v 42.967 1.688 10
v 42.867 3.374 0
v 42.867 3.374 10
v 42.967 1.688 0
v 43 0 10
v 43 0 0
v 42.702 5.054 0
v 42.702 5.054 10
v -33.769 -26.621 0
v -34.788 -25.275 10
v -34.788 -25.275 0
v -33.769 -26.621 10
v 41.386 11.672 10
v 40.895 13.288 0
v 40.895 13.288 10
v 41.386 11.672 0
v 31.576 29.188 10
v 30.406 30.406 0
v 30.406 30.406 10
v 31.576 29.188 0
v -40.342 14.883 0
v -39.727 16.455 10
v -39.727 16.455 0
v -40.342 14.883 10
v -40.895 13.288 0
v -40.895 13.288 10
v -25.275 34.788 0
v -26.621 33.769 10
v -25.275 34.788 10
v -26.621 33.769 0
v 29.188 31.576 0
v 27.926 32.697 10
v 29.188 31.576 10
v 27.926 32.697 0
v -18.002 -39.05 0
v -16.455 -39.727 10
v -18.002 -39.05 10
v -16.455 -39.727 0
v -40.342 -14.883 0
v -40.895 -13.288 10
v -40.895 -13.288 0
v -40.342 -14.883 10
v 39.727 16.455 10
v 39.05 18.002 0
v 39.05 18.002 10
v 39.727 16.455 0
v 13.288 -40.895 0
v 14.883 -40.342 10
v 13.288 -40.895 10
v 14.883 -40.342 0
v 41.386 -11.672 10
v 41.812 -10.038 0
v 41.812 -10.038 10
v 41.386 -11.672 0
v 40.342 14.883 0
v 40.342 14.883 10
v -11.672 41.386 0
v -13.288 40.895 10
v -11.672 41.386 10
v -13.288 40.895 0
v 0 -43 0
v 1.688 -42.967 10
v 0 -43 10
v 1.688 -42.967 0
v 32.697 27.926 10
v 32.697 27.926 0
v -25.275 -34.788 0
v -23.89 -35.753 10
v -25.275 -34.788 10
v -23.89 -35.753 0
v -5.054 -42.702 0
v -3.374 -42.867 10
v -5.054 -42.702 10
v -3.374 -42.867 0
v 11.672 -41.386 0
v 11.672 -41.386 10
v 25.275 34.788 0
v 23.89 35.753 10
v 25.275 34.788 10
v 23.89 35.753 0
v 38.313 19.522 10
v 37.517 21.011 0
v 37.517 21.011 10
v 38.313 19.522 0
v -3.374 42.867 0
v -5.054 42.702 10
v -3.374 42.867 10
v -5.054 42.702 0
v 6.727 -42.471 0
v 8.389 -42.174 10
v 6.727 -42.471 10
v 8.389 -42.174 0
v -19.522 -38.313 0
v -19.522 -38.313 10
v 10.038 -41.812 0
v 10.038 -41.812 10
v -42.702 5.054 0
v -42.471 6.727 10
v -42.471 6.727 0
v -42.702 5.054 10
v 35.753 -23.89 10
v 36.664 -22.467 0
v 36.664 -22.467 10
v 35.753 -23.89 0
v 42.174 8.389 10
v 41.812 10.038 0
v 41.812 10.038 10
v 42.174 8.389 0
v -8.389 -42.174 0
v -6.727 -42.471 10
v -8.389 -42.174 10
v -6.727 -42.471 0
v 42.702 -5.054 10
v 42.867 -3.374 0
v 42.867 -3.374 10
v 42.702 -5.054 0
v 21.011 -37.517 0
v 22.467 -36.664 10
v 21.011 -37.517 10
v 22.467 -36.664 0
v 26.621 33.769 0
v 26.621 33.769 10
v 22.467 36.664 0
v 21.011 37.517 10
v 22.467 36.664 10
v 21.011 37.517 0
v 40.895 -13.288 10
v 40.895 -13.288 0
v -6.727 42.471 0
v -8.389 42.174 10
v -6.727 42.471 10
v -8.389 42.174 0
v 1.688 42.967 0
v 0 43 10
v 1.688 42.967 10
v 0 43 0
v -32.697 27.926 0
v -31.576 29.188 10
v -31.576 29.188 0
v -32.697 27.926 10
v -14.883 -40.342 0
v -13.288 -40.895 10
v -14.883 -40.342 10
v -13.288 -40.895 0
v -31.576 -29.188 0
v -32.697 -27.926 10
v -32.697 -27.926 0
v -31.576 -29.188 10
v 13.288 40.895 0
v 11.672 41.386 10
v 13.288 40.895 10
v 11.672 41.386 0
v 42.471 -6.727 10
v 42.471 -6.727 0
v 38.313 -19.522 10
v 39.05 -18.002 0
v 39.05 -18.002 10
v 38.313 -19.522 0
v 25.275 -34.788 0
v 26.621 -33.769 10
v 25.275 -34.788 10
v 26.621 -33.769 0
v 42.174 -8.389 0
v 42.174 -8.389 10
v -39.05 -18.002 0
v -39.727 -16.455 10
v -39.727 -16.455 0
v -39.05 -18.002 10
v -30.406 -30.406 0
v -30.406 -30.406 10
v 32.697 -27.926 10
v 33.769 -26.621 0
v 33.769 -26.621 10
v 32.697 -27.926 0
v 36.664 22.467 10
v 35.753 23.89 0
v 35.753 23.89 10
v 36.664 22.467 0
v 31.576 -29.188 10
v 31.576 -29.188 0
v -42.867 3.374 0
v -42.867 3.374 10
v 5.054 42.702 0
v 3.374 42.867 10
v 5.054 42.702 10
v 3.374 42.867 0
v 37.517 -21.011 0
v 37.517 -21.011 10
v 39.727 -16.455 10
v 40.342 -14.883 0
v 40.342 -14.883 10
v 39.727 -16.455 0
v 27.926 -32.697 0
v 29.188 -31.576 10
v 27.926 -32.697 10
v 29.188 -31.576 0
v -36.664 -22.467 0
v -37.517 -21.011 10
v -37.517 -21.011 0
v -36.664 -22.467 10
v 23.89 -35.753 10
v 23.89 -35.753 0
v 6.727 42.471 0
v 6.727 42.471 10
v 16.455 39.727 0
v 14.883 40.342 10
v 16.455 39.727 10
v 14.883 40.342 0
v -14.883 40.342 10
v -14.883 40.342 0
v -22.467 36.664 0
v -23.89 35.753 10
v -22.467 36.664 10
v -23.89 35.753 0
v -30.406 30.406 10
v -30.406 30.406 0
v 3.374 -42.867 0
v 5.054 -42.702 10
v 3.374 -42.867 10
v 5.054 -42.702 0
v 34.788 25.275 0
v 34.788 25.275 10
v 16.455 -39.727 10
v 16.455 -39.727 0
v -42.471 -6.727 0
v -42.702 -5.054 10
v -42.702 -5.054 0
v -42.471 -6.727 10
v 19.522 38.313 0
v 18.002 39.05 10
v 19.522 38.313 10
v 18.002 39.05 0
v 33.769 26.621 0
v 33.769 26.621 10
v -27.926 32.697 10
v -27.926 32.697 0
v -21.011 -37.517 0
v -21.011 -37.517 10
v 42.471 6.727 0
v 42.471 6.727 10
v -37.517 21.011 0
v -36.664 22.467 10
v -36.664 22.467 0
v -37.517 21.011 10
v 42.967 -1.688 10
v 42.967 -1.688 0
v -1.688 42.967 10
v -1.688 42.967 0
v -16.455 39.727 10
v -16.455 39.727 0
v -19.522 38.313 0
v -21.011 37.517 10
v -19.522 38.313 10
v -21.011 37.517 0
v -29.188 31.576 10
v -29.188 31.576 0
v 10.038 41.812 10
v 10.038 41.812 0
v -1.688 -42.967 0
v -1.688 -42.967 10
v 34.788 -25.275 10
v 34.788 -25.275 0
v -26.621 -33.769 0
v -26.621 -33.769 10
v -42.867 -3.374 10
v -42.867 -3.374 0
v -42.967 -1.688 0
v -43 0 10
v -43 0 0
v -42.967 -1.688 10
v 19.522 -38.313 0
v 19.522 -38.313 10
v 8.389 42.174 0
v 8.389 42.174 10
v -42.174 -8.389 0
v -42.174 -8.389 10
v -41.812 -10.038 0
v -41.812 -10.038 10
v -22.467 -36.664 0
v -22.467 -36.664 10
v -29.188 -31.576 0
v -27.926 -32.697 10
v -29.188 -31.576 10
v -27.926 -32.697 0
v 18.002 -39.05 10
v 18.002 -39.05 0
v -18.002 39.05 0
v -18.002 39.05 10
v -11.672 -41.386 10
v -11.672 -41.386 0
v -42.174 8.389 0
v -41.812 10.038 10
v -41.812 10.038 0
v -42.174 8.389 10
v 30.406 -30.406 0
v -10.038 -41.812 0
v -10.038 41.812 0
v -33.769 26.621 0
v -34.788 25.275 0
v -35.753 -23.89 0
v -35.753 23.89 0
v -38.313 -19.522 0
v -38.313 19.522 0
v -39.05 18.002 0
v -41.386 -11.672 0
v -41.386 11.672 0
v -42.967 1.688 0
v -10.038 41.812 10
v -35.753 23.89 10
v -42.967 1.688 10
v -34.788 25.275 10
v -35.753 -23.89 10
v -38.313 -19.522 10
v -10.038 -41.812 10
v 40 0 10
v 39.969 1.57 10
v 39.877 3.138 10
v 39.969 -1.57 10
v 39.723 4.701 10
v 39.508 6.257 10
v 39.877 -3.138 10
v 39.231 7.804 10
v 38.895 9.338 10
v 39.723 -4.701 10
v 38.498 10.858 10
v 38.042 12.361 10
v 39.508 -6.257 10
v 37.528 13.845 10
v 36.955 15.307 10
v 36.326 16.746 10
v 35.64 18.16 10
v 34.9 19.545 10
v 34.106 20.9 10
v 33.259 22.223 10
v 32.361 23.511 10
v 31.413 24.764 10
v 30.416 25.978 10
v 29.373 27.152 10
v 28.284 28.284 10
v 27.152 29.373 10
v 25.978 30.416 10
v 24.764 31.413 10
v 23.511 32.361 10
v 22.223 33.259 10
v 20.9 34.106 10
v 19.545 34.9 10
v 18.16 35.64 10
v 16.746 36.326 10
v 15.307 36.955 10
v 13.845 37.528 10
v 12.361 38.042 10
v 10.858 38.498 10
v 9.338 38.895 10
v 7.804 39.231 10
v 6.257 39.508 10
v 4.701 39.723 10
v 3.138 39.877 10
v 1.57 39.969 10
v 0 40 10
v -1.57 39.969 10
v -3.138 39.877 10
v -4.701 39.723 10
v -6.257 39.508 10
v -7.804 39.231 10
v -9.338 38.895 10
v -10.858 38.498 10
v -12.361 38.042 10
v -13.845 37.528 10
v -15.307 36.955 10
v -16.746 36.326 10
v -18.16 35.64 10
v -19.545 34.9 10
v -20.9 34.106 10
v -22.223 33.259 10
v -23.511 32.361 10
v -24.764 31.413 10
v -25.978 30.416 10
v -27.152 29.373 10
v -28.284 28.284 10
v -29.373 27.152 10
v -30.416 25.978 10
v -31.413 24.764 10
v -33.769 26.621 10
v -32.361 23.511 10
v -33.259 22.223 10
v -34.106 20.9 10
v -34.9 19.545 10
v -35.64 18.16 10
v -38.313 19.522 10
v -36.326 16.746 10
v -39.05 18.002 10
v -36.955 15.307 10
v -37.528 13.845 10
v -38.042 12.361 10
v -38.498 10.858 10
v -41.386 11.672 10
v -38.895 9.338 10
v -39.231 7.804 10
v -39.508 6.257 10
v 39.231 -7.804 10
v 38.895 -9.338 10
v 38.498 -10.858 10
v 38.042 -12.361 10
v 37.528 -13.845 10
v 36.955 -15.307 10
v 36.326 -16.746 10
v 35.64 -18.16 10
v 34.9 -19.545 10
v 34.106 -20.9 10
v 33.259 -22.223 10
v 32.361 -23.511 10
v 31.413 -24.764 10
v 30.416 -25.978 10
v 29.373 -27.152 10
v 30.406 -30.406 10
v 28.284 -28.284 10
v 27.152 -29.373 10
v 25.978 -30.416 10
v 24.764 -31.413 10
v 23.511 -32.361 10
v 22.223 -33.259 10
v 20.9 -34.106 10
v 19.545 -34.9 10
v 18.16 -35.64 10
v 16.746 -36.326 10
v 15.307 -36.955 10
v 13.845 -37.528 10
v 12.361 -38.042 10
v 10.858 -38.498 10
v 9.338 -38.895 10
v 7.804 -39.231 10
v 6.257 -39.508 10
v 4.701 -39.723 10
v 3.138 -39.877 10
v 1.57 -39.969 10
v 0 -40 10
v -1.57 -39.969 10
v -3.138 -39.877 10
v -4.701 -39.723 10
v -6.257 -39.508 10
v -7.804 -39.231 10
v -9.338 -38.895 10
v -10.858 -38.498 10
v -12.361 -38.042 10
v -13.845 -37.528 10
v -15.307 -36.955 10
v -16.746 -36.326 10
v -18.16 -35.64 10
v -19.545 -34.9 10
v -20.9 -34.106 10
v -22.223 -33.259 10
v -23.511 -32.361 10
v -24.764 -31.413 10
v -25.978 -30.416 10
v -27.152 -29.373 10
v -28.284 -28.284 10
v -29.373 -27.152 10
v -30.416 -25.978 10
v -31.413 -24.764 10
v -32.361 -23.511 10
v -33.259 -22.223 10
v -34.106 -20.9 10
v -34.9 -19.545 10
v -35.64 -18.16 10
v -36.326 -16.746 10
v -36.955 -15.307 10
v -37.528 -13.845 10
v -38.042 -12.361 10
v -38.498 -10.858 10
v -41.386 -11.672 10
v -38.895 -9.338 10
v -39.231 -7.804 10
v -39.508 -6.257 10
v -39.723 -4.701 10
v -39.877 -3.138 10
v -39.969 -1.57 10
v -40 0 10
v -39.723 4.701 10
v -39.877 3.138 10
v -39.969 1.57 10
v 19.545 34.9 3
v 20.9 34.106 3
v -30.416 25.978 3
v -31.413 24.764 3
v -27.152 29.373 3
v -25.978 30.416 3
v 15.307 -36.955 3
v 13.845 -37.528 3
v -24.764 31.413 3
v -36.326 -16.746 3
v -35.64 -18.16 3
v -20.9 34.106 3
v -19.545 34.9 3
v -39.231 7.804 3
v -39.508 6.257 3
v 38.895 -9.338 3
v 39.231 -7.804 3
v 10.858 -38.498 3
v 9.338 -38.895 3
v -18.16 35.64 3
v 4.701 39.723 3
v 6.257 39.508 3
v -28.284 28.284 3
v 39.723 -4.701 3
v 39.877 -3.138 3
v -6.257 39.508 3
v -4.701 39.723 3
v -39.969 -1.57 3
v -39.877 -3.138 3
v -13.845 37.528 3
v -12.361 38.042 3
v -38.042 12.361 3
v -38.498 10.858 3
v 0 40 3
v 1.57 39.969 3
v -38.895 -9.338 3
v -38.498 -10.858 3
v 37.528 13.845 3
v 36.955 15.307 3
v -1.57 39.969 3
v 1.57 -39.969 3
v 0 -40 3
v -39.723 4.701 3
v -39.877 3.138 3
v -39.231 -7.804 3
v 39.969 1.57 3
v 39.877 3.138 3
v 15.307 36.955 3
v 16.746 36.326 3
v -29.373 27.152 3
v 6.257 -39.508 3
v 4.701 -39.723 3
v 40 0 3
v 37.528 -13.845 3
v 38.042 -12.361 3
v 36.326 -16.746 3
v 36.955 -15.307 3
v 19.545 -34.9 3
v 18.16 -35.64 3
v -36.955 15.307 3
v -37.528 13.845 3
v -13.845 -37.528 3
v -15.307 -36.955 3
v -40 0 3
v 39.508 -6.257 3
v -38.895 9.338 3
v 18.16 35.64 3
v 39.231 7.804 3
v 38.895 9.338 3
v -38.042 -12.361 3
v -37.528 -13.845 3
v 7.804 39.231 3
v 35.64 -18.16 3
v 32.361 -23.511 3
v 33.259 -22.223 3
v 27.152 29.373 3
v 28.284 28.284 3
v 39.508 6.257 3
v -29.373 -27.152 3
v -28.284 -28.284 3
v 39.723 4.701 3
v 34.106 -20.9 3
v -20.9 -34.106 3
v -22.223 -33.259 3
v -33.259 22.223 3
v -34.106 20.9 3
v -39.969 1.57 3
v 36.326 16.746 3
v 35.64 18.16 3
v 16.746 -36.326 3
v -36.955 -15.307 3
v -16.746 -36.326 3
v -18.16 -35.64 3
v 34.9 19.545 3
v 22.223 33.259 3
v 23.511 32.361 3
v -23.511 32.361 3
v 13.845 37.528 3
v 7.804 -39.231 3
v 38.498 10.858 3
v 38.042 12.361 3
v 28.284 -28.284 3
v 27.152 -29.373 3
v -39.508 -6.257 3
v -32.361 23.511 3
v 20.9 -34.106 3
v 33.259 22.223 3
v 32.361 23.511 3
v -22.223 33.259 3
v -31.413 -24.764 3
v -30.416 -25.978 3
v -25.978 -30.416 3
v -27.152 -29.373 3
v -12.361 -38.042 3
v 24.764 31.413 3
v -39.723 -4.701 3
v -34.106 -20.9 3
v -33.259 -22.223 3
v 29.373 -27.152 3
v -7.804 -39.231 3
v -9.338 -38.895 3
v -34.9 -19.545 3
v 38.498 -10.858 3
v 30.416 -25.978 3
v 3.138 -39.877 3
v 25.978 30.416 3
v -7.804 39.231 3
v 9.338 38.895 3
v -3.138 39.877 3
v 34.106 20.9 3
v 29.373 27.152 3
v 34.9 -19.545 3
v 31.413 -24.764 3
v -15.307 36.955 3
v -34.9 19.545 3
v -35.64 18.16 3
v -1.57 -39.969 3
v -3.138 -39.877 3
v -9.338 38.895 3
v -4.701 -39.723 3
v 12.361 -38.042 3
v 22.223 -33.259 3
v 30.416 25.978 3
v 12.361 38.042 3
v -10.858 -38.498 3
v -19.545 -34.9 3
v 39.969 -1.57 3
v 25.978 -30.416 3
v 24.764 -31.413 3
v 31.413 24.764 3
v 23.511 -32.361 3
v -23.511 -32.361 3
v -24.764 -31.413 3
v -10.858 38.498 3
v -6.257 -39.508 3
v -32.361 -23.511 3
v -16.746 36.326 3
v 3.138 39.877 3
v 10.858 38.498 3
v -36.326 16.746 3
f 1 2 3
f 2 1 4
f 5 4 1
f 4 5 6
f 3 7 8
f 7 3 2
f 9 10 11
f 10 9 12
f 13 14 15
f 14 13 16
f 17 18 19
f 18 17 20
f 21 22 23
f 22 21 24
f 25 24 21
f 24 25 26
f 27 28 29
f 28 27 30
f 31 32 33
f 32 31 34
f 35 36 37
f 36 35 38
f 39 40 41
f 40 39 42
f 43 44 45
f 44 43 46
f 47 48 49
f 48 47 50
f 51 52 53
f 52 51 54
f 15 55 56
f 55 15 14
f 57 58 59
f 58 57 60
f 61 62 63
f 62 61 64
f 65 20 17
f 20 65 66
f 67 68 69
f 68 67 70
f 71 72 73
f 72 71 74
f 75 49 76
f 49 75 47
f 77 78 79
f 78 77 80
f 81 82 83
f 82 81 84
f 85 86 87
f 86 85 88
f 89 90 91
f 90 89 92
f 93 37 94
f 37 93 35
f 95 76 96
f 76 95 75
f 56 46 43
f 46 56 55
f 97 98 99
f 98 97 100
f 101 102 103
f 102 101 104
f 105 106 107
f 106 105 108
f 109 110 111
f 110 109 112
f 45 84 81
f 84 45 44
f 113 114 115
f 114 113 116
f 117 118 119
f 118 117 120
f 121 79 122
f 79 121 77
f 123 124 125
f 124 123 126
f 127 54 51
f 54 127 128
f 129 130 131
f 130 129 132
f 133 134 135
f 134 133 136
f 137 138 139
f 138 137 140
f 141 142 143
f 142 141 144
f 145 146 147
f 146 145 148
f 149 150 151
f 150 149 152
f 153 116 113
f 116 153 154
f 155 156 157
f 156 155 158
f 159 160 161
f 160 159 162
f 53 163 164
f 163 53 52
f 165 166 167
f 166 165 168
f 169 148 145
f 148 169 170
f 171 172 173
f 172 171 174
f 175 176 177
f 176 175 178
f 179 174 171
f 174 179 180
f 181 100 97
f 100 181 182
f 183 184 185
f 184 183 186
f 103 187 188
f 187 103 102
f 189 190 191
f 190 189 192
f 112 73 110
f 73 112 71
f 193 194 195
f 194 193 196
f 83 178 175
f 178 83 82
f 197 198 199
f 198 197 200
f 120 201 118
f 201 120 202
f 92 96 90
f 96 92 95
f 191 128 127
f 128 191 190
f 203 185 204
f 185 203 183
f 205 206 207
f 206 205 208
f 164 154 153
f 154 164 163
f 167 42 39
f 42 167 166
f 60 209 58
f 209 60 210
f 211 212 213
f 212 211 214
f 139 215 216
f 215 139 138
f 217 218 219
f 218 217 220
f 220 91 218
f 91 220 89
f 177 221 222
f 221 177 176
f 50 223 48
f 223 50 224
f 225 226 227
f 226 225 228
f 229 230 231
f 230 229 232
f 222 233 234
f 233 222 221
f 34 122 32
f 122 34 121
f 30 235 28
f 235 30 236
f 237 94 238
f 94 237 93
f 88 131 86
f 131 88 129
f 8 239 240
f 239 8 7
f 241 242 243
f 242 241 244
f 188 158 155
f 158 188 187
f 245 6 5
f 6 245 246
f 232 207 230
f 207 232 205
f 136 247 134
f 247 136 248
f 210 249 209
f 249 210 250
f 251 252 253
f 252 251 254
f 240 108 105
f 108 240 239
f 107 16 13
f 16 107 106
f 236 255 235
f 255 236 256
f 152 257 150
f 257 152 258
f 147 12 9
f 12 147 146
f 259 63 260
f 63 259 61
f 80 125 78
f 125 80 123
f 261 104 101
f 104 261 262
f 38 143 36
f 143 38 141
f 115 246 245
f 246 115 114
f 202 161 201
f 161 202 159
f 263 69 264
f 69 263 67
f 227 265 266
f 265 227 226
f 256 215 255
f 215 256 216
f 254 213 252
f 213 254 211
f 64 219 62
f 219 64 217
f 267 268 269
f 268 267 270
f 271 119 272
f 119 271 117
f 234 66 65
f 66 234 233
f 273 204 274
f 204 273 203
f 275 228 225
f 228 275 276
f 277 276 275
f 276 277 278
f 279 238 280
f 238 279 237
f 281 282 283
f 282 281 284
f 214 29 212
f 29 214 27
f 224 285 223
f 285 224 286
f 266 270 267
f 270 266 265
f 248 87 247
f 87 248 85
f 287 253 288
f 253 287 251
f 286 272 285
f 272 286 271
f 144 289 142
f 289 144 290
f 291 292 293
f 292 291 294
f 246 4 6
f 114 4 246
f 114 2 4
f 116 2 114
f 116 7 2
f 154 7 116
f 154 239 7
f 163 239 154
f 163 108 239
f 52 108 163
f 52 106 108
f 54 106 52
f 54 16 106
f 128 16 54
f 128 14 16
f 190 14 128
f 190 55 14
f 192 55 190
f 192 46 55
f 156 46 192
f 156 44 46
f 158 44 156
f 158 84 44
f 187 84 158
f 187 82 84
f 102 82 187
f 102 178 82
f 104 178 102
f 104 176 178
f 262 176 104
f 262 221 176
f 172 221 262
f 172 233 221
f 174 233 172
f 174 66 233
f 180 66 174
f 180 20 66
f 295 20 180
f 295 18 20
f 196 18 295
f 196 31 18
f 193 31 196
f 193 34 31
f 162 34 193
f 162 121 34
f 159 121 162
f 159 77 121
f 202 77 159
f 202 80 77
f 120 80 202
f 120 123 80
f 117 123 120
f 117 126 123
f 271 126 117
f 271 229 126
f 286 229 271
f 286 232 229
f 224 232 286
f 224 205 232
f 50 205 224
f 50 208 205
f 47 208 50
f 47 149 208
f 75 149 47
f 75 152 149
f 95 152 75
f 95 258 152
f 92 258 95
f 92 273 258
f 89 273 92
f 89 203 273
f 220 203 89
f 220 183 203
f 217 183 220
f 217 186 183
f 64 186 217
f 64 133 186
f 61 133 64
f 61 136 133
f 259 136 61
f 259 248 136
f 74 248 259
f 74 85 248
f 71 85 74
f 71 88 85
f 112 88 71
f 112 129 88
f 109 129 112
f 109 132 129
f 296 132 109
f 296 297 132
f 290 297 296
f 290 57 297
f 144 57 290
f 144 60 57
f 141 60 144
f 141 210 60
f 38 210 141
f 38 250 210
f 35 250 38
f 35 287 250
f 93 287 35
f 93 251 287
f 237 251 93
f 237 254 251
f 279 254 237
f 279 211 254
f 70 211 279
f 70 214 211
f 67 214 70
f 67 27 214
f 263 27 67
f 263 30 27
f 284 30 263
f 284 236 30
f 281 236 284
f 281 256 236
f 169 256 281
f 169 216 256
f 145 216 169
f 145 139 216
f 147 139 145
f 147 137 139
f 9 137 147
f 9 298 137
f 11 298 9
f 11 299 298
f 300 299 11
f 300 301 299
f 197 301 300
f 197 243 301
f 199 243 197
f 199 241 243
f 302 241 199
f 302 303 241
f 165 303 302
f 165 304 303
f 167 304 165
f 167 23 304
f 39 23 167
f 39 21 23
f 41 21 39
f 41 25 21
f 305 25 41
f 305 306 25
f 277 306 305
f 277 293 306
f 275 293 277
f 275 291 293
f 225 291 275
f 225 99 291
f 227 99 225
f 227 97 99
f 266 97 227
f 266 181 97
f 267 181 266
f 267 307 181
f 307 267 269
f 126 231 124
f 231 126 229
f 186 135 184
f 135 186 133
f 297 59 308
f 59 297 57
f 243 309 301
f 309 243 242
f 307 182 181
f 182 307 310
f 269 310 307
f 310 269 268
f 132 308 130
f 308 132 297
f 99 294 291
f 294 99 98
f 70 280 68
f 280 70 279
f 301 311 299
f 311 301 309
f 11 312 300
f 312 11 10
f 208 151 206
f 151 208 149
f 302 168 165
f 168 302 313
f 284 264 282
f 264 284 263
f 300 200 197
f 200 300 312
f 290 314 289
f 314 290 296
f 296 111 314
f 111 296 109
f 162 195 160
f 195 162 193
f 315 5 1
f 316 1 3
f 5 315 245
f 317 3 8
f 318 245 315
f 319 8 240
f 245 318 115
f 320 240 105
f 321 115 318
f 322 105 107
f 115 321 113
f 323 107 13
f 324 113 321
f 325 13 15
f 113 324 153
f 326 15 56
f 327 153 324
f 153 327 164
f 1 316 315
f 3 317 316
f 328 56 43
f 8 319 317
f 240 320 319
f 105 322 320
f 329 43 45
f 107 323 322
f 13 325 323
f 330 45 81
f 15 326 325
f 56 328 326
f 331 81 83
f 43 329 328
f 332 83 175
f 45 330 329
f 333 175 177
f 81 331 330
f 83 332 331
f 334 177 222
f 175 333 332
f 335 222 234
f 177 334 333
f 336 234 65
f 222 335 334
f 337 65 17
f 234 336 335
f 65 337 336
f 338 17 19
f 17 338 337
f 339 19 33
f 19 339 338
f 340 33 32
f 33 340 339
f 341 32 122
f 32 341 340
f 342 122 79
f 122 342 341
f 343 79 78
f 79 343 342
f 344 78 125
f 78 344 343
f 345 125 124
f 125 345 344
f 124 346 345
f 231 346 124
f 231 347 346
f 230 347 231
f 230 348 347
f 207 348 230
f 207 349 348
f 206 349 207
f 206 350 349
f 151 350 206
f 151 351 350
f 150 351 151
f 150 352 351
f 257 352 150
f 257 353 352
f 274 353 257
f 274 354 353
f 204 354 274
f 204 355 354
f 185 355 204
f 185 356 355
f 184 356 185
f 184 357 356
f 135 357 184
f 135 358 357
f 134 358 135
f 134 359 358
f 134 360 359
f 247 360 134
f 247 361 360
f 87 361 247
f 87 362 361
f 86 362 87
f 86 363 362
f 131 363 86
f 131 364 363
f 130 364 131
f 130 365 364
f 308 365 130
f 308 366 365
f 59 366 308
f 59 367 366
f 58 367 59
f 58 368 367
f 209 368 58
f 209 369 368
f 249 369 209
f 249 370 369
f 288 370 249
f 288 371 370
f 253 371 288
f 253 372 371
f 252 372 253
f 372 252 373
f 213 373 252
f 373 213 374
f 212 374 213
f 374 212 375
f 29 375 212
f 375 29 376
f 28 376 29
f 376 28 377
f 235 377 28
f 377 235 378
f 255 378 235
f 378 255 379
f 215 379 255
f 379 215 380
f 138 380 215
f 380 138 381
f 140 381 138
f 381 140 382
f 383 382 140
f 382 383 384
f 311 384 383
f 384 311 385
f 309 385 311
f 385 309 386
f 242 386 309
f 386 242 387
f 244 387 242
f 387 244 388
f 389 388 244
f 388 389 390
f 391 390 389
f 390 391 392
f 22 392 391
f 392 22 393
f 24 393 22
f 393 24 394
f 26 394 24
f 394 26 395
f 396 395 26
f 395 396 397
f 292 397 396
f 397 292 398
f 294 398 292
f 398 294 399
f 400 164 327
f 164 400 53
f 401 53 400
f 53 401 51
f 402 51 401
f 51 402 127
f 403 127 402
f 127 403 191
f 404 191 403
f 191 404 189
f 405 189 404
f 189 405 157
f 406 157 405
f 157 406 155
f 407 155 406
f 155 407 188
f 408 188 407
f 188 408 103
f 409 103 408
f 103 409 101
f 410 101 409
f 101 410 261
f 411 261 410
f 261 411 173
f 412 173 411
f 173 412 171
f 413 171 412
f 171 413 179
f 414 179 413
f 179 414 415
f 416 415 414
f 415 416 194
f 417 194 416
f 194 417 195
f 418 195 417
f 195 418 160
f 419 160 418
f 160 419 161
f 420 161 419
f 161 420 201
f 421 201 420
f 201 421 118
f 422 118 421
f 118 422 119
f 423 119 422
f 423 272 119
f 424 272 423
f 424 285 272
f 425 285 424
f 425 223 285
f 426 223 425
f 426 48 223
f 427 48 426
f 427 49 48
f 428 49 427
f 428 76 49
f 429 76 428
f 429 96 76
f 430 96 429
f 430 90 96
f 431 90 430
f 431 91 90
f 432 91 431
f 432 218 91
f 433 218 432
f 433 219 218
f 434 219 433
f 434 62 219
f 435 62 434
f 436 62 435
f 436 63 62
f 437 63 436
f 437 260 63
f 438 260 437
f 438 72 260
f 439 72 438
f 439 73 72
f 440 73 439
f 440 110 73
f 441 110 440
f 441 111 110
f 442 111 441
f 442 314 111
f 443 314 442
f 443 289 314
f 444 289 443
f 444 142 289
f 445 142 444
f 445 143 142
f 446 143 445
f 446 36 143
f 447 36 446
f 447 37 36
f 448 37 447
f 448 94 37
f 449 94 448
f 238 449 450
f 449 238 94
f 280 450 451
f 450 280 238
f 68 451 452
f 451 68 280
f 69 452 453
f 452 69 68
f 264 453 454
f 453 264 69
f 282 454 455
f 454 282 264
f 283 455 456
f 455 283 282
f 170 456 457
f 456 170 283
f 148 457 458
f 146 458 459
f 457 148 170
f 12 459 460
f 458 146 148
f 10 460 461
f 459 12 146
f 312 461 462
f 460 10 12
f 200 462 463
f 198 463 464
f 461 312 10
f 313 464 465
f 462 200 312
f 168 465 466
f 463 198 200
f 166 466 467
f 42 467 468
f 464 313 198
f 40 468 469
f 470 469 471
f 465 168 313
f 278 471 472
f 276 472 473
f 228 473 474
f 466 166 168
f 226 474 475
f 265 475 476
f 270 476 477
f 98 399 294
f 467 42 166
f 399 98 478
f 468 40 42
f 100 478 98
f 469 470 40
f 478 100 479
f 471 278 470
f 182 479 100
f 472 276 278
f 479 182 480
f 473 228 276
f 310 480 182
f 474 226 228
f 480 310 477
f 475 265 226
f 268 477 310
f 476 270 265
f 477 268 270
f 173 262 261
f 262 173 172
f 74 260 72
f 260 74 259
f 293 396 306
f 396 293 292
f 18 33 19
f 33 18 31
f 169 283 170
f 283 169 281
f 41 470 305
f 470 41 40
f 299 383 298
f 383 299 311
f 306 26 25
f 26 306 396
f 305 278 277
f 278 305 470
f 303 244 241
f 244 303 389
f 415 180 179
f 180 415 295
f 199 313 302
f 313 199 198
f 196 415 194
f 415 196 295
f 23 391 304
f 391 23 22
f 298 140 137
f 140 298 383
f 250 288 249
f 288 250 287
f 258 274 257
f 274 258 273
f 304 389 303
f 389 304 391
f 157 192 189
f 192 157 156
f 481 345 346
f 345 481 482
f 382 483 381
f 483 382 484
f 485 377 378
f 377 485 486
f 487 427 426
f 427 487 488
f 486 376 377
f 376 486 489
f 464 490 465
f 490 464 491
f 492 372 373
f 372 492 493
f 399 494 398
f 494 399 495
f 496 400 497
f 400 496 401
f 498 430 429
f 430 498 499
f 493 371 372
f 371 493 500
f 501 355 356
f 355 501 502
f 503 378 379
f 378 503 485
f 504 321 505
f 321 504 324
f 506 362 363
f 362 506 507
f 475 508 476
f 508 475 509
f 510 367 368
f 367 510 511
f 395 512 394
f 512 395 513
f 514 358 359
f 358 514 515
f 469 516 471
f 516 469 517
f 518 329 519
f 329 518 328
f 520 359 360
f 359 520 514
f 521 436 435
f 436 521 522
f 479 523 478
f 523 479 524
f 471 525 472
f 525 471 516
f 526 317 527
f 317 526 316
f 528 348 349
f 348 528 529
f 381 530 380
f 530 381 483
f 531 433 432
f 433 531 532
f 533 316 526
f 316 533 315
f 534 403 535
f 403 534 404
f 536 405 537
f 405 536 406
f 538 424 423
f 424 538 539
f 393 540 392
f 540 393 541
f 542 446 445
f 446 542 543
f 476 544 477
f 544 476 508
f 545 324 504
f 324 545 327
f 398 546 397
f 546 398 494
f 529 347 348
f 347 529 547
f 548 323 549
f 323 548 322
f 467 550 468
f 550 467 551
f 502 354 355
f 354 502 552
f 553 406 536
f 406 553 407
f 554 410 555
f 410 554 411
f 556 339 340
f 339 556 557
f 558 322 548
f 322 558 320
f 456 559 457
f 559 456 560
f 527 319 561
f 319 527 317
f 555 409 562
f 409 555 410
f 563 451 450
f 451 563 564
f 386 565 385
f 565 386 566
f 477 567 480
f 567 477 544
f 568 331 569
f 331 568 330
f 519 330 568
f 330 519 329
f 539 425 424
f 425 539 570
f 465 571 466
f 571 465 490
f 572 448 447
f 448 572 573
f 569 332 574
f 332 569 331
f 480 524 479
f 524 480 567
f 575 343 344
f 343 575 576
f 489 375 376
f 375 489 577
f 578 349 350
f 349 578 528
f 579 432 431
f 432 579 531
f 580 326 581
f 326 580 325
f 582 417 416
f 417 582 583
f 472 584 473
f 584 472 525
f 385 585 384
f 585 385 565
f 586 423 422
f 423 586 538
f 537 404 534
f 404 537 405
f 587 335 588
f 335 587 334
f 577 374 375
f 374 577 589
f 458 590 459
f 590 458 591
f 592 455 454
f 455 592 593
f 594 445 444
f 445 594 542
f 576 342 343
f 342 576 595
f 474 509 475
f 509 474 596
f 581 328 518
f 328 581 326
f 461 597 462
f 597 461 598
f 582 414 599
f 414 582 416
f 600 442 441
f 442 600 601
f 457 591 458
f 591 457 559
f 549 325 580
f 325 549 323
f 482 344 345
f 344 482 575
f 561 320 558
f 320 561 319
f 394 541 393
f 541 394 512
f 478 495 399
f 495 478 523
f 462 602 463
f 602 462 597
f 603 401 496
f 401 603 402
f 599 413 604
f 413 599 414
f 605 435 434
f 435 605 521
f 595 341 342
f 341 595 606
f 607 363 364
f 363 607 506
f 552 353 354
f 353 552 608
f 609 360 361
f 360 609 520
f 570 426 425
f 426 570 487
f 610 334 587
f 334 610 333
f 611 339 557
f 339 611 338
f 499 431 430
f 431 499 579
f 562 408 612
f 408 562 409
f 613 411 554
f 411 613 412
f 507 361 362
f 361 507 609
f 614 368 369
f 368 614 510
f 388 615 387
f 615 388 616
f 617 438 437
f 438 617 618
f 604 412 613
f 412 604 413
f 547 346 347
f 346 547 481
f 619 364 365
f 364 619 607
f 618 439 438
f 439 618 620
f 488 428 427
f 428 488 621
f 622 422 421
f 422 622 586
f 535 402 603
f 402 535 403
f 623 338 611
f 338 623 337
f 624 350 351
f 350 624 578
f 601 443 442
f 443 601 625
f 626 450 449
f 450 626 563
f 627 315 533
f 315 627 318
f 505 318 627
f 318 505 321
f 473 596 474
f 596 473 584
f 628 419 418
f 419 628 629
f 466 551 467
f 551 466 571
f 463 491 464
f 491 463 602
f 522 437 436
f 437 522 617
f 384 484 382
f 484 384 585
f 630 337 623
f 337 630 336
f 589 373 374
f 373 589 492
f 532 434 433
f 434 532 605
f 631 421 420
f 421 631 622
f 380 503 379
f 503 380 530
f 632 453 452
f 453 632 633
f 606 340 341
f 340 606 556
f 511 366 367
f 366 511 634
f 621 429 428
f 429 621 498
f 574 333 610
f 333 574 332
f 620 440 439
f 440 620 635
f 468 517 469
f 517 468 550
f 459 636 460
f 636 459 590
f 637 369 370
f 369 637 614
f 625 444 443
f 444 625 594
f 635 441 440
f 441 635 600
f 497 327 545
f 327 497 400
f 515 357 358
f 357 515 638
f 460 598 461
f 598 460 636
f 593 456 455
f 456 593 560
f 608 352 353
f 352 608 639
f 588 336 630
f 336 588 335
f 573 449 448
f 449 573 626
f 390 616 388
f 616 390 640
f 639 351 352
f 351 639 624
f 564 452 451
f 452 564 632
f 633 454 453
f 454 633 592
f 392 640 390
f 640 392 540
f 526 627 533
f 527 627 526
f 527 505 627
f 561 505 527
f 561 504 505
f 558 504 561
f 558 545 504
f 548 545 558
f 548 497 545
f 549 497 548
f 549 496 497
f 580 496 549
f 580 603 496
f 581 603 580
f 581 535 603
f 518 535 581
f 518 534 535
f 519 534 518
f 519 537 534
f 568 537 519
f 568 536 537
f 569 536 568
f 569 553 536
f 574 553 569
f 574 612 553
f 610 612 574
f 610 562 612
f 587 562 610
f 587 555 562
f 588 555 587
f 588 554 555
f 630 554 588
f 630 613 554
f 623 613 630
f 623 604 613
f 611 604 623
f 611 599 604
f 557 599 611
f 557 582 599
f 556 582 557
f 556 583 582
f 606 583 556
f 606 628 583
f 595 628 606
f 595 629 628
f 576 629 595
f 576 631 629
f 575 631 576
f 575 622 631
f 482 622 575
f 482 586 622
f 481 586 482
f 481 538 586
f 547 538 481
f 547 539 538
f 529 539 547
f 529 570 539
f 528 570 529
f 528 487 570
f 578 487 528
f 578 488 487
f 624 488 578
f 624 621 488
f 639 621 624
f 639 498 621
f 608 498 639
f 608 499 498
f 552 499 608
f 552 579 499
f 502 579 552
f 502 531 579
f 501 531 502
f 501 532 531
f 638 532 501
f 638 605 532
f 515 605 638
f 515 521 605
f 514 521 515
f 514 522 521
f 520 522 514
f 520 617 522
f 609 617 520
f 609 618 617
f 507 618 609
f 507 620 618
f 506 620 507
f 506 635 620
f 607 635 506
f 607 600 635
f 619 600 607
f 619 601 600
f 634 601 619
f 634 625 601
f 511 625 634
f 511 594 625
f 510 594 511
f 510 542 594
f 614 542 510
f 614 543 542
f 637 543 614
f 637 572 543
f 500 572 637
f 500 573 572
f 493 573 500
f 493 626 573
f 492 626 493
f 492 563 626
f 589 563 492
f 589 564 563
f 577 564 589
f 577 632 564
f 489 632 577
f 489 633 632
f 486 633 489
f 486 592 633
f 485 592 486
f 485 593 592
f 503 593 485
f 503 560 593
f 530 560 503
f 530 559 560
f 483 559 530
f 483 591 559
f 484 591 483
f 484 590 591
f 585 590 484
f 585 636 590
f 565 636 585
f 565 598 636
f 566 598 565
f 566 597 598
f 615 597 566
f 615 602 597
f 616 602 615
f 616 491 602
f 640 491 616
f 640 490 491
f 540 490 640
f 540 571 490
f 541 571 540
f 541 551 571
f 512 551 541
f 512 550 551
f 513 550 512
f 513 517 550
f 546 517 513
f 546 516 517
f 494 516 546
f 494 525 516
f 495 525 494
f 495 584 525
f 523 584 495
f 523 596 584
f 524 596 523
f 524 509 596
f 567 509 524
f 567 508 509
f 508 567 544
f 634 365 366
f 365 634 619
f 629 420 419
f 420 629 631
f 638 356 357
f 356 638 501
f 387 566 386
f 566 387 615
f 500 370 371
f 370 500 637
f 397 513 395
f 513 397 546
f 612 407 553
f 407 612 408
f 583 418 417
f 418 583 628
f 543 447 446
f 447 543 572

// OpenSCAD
//inner diameter
diameter=80;

//total height
height=10;

//wall & bottom thickness
thickness=3;

// calculate radius
radius=(diameter/2)+thickness;
innerradius=diameter/2;

// define the object
difference(){
	cylinder(h=height, r=radius, center=false, $fn=2*diameter);
	translate([0,0,thickness]){
		cylinder(h=height, r=innerradius, center=false, $fn=2*diameter);
	}
};
